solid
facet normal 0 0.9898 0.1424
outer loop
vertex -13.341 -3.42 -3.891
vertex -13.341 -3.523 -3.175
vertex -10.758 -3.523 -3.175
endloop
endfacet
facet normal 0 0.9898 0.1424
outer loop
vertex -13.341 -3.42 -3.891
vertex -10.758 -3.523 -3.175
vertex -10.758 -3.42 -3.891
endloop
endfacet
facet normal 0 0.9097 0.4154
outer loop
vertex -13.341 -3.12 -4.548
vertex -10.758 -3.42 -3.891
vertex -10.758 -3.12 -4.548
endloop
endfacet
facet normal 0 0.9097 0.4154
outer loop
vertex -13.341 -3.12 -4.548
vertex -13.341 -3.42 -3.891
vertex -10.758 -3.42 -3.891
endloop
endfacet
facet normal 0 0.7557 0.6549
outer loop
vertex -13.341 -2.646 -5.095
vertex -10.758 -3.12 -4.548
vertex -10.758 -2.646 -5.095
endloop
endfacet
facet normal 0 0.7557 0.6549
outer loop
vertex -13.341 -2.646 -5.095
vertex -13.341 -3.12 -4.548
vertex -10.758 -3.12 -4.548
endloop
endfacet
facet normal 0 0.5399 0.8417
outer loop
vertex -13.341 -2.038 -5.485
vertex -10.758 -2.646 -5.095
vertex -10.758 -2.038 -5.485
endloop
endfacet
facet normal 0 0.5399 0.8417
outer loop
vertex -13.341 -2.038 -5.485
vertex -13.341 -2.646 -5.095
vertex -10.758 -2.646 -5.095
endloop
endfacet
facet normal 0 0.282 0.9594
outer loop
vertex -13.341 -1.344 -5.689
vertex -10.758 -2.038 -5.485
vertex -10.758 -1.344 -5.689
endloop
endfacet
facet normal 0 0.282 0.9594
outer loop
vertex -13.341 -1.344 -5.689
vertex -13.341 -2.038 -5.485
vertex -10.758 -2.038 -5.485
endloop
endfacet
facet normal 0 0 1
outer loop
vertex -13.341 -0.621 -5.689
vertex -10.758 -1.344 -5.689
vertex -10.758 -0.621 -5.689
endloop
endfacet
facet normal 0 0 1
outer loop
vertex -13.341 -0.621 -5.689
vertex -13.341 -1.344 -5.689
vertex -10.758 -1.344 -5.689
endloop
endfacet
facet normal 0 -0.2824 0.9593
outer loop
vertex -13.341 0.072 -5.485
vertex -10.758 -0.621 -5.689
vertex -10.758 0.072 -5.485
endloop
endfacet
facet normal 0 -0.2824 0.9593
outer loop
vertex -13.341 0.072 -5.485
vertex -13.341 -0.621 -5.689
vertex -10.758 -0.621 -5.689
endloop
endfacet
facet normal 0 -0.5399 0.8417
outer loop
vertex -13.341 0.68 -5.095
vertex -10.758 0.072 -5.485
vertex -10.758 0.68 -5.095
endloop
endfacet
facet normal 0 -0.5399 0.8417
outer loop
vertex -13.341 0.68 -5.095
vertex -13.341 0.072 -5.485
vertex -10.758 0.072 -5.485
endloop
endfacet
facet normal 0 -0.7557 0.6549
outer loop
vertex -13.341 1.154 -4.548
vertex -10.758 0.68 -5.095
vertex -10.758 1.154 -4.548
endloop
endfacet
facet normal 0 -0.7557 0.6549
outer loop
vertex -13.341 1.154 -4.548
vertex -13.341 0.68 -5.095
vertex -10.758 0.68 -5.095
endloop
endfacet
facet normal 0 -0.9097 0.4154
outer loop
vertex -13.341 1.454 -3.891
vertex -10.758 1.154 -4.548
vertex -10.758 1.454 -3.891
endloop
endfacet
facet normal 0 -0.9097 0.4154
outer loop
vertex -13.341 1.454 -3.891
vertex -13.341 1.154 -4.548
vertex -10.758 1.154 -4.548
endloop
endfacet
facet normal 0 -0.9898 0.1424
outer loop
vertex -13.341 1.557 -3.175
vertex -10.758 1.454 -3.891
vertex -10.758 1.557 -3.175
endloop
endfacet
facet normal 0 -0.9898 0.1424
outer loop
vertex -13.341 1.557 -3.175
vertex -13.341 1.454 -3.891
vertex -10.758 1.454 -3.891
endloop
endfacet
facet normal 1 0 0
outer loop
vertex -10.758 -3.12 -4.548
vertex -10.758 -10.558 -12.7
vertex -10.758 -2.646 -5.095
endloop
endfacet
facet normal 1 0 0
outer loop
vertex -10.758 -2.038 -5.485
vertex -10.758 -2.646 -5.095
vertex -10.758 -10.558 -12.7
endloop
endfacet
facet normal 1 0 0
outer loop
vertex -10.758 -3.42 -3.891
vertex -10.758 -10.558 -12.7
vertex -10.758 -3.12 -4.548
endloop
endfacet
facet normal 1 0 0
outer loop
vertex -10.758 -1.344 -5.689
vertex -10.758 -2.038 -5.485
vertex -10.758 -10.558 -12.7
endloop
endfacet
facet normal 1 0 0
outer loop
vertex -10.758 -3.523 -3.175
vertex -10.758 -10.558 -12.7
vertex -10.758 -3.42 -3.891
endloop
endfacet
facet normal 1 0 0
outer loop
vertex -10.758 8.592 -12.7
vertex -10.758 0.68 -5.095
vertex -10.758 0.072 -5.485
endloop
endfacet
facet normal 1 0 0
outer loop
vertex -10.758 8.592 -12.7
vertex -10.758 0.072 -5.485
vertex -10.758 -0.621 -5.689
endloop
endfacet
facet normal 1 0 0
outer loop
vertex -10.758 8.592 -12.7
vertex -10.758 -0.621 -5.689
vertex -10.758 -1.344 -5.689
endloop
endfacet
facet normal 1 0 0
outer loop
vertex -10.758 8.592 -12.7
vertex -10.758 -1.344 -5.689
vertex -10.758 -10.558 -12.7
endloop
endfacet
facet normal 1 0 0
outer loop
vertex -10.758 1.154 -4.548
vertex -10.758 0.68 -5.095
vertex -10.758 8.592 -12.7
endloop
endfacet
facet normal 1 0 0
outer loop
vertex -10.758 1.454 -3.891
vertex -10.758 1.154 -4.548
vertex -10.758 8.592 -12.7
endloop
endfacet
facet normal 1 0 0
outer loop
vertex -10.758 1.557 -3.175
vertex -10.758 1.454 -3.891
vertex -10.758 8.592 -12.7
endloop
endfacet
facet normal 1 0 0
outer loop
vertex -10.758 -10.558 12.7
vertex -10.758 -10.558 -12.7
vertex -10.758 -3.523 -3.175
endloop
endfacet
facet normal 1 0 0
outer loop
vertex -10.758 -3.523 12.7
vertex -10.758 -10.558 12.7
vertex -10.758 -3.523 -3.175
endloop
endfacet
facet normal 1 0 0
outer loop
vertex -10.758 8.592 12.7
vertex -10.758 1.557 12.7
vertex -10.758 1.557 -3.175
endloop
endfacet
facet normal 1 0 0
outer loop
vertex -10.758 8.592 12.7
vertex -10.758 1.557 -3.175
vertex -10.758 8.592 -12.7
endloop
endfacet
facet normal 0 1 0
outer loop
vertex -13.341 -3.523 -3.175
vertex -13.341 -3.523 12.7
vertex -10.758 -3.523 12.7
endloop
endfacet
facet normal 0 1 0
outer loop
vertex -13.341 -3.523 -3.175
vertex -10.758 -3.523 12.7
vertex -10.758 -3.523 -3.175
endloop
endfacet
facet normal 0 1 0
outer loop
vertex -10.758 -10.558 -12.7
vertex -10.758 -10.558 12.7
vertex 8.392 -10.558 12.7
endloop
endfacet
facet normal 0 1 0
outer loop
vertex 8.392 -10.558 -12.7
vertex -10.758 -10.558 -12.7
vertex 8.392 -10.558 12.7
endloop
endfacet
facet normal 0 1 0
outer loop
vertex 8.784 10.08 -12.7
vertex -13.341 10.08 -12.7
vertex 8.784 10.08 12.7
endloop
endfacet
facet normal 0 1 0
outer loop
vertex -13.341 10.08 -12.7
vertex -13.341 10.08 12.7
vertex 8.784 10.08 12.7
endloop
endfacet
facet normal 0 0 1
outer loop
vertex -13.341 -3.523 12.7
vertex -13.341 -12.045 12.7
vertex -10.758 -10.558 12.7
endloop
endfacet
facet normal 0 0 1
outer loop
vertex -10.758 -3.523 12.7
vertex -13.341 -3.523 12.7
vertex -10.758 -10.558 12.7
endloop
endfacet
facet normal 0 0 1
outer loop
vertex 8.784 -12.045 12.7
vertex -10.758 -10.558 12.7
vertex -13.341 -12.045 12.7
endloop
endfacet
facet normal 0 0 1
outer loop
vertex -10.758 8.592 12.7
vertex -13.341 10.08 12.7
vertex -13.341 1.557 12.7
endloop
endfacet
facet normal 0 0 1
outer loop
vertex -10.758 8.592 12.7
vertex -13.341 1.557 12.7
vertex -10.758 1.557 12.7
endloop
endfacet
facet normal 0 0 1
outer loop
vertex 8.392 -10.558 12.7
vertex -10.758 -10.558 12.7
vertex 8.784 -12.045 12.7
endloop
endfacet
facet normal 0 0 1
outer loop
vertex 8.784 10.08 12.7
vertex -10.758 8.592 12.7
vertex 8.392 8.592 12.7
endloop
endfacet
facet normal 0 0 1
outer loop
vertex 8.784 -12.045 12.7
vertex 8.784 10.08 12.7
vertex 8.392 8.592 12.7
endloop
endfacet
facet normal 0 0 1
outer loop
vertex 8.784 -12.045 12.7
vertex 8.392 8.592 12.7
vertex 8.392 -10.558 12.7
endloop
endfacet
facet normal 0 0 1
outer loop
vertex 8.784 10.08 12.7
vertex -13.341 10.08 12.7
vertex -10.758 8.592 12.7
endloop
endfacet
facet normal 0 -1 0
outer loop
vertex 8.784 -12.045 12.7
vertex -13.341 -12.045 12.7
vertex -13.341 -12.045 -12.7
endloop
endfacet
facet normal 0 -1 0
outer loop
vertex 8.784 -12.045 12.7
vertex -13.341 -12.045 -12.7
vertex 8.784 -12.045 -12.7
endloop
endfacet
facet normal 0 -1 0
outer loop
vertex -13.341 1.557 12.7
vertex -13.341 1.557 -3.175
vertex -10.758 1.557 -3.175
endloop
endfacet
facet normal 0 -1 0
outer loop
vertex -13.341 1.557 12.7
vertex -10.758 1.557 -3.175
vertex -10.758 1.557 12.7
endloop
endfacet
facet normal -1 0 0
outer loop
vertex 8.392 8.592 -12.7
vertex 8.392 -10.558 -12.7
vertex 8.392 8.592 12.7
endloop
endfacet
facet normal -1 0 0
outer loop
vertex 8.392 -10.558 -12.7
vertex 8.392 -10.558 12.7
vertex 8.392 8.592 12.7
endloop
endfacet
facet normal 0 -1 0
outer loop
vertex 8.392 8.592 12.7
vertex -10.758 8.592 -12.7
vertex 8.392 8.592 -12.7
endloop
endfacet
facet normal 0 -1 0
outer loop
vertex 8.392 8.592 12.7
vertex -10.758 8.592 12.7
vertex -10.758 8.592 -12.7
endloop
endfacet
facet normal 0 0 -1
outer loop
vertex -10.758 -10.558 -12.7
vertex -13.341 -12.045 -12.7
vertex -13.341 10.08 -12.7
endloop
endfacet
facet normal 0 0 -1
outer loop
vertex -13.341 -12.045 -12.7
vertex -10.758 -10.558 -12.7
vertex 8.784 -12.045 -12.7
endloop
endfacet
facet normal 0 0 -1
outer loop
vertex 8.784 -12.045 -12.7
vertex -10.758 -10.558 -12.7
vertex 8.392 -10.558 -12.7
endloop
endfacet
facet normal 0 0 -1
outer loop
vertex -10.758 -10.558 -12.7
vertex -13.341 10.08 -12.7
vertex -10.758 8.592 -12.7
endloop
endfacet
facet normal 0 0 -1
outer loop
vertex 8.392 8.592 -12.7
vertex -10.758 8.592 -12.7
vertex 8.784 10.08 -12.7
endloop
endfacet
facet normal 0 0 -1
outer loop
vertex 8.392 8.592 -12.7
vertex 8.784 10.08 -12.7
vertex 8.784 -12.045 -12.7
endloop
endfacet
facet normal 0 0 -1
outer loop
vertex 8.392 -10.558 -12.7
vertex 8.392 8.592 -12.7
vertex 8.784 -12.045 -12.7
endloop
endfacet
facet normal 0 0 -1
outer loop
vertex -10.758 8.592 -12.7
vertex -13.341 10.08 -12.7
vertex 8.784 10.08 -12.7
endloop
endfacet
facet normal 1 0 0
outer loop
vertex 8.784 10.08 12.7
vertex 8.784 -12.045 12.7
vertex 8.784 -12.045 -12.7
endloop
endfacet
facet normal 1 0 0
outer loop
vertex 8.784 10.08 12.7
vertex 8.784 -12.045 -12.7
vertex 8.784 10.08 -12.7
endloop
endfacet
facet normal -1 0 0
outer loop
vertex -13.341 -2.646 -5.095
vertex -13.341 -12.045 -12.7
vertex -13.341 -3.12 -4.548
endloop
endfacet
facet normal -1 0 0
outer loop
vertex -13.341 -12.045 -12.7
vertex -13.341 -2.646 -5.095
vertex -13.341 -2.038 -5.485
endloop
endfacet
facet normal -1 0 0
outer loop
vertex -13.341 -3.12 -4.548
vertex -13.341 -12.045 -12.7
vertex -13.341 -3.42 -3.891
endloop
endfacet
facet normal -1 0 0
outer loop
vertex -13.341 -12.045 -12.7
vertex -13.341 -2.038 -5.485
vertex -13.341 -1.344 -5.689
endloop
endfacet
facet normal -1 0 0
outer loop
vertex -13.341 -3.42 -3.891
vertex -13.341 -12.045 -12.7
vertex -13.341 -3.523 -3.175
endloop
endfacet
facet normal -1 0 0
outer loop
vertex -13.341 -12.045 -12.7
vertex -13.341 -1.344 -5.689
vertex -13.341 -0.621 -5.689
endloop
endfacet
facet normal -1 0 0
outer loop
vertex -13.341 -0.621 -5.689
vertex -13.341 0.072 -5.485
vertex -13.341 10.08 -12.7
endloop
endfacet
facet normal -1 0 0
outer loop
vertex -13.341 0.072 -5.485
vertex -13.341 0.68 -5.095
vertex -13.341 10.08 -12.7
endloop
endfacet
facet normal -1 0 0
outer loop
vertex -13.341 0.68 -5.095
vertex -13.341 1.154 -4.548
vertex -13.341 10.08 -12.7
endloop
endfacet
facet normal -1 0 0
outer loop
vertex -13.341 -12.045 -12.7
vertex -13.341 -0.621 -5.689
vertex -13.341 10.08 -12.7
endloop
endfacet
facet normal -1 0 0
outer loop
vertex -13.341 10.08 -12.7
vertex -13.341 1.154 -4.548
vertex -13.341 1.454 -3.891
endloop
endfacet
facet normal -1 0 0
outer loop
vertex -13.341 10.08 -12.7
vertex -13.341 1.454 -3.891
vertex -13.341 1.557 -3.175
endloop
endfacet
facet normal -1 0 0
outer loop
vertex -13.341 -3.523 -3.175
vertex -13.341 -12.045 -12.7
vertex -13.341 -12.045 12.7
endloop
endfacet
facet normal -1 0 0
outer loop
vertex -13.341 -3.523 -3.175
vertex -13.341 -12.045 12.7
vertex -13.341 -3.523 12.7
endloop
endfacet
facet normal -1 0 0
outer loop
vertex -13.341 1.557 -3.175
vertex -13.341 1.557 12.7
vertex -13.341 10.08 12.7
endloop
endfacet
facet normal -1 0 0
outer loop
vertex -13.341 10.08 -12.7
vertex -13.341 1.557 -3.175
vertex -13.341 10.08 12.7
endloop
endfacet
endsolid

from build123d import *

# Parameters (mm, degrees)
SKETCH1_W           = 22.125
SKETCH1_H           = 22.125
SKETCH1_W_2         = 19.15
SKETCH1_H_2         = 19.15
BOSS_EXTRUDE1_DEPTH = 12.7
CUT_EXTRUDE1_DEPTH  = 12.7


with BuildPart() as part:
    # Sketch1 → Boss-Extrude1 (new body, symmetric)
    with BuildSketch(Plane.XY):
        with Locations((-2.278232981, -0.982857981)):
            Rectangle(SKETCH1_W, SKETCH1_H)
        with Locations((-1.182857981, -0.982857981)):
            Rectangle(SKETCH1_W_2, SKETCH1_H_2, mode=Mode.SUBTRACT)
    extrude(amount=BOSS_EXTRUDE1_DEPTH, both=True)

    # Sketch2 → Cut-Extrude1 (cut)
    with BuildSketch(Plane.ZY.offset(13.340732981)):
        with BuildLine():
            Line((-3.175, 1.557142019), (12.7, 1.557142019))
            Line((12.7, 1.557142019), (12.7, -3.522857981))
            Line((12.7, -3.522857981), (-3.175, -3.522857981))
            ThreePointArc((-3.175, -3.522857981), (-5.715, -0.982857981), (-3.175, 1.557142019))
        make_face()
    extrude(amount=-CUT_EXTRUDE1_DEPTH, mode=Mode.SUBTRACT)


solid = part.part
